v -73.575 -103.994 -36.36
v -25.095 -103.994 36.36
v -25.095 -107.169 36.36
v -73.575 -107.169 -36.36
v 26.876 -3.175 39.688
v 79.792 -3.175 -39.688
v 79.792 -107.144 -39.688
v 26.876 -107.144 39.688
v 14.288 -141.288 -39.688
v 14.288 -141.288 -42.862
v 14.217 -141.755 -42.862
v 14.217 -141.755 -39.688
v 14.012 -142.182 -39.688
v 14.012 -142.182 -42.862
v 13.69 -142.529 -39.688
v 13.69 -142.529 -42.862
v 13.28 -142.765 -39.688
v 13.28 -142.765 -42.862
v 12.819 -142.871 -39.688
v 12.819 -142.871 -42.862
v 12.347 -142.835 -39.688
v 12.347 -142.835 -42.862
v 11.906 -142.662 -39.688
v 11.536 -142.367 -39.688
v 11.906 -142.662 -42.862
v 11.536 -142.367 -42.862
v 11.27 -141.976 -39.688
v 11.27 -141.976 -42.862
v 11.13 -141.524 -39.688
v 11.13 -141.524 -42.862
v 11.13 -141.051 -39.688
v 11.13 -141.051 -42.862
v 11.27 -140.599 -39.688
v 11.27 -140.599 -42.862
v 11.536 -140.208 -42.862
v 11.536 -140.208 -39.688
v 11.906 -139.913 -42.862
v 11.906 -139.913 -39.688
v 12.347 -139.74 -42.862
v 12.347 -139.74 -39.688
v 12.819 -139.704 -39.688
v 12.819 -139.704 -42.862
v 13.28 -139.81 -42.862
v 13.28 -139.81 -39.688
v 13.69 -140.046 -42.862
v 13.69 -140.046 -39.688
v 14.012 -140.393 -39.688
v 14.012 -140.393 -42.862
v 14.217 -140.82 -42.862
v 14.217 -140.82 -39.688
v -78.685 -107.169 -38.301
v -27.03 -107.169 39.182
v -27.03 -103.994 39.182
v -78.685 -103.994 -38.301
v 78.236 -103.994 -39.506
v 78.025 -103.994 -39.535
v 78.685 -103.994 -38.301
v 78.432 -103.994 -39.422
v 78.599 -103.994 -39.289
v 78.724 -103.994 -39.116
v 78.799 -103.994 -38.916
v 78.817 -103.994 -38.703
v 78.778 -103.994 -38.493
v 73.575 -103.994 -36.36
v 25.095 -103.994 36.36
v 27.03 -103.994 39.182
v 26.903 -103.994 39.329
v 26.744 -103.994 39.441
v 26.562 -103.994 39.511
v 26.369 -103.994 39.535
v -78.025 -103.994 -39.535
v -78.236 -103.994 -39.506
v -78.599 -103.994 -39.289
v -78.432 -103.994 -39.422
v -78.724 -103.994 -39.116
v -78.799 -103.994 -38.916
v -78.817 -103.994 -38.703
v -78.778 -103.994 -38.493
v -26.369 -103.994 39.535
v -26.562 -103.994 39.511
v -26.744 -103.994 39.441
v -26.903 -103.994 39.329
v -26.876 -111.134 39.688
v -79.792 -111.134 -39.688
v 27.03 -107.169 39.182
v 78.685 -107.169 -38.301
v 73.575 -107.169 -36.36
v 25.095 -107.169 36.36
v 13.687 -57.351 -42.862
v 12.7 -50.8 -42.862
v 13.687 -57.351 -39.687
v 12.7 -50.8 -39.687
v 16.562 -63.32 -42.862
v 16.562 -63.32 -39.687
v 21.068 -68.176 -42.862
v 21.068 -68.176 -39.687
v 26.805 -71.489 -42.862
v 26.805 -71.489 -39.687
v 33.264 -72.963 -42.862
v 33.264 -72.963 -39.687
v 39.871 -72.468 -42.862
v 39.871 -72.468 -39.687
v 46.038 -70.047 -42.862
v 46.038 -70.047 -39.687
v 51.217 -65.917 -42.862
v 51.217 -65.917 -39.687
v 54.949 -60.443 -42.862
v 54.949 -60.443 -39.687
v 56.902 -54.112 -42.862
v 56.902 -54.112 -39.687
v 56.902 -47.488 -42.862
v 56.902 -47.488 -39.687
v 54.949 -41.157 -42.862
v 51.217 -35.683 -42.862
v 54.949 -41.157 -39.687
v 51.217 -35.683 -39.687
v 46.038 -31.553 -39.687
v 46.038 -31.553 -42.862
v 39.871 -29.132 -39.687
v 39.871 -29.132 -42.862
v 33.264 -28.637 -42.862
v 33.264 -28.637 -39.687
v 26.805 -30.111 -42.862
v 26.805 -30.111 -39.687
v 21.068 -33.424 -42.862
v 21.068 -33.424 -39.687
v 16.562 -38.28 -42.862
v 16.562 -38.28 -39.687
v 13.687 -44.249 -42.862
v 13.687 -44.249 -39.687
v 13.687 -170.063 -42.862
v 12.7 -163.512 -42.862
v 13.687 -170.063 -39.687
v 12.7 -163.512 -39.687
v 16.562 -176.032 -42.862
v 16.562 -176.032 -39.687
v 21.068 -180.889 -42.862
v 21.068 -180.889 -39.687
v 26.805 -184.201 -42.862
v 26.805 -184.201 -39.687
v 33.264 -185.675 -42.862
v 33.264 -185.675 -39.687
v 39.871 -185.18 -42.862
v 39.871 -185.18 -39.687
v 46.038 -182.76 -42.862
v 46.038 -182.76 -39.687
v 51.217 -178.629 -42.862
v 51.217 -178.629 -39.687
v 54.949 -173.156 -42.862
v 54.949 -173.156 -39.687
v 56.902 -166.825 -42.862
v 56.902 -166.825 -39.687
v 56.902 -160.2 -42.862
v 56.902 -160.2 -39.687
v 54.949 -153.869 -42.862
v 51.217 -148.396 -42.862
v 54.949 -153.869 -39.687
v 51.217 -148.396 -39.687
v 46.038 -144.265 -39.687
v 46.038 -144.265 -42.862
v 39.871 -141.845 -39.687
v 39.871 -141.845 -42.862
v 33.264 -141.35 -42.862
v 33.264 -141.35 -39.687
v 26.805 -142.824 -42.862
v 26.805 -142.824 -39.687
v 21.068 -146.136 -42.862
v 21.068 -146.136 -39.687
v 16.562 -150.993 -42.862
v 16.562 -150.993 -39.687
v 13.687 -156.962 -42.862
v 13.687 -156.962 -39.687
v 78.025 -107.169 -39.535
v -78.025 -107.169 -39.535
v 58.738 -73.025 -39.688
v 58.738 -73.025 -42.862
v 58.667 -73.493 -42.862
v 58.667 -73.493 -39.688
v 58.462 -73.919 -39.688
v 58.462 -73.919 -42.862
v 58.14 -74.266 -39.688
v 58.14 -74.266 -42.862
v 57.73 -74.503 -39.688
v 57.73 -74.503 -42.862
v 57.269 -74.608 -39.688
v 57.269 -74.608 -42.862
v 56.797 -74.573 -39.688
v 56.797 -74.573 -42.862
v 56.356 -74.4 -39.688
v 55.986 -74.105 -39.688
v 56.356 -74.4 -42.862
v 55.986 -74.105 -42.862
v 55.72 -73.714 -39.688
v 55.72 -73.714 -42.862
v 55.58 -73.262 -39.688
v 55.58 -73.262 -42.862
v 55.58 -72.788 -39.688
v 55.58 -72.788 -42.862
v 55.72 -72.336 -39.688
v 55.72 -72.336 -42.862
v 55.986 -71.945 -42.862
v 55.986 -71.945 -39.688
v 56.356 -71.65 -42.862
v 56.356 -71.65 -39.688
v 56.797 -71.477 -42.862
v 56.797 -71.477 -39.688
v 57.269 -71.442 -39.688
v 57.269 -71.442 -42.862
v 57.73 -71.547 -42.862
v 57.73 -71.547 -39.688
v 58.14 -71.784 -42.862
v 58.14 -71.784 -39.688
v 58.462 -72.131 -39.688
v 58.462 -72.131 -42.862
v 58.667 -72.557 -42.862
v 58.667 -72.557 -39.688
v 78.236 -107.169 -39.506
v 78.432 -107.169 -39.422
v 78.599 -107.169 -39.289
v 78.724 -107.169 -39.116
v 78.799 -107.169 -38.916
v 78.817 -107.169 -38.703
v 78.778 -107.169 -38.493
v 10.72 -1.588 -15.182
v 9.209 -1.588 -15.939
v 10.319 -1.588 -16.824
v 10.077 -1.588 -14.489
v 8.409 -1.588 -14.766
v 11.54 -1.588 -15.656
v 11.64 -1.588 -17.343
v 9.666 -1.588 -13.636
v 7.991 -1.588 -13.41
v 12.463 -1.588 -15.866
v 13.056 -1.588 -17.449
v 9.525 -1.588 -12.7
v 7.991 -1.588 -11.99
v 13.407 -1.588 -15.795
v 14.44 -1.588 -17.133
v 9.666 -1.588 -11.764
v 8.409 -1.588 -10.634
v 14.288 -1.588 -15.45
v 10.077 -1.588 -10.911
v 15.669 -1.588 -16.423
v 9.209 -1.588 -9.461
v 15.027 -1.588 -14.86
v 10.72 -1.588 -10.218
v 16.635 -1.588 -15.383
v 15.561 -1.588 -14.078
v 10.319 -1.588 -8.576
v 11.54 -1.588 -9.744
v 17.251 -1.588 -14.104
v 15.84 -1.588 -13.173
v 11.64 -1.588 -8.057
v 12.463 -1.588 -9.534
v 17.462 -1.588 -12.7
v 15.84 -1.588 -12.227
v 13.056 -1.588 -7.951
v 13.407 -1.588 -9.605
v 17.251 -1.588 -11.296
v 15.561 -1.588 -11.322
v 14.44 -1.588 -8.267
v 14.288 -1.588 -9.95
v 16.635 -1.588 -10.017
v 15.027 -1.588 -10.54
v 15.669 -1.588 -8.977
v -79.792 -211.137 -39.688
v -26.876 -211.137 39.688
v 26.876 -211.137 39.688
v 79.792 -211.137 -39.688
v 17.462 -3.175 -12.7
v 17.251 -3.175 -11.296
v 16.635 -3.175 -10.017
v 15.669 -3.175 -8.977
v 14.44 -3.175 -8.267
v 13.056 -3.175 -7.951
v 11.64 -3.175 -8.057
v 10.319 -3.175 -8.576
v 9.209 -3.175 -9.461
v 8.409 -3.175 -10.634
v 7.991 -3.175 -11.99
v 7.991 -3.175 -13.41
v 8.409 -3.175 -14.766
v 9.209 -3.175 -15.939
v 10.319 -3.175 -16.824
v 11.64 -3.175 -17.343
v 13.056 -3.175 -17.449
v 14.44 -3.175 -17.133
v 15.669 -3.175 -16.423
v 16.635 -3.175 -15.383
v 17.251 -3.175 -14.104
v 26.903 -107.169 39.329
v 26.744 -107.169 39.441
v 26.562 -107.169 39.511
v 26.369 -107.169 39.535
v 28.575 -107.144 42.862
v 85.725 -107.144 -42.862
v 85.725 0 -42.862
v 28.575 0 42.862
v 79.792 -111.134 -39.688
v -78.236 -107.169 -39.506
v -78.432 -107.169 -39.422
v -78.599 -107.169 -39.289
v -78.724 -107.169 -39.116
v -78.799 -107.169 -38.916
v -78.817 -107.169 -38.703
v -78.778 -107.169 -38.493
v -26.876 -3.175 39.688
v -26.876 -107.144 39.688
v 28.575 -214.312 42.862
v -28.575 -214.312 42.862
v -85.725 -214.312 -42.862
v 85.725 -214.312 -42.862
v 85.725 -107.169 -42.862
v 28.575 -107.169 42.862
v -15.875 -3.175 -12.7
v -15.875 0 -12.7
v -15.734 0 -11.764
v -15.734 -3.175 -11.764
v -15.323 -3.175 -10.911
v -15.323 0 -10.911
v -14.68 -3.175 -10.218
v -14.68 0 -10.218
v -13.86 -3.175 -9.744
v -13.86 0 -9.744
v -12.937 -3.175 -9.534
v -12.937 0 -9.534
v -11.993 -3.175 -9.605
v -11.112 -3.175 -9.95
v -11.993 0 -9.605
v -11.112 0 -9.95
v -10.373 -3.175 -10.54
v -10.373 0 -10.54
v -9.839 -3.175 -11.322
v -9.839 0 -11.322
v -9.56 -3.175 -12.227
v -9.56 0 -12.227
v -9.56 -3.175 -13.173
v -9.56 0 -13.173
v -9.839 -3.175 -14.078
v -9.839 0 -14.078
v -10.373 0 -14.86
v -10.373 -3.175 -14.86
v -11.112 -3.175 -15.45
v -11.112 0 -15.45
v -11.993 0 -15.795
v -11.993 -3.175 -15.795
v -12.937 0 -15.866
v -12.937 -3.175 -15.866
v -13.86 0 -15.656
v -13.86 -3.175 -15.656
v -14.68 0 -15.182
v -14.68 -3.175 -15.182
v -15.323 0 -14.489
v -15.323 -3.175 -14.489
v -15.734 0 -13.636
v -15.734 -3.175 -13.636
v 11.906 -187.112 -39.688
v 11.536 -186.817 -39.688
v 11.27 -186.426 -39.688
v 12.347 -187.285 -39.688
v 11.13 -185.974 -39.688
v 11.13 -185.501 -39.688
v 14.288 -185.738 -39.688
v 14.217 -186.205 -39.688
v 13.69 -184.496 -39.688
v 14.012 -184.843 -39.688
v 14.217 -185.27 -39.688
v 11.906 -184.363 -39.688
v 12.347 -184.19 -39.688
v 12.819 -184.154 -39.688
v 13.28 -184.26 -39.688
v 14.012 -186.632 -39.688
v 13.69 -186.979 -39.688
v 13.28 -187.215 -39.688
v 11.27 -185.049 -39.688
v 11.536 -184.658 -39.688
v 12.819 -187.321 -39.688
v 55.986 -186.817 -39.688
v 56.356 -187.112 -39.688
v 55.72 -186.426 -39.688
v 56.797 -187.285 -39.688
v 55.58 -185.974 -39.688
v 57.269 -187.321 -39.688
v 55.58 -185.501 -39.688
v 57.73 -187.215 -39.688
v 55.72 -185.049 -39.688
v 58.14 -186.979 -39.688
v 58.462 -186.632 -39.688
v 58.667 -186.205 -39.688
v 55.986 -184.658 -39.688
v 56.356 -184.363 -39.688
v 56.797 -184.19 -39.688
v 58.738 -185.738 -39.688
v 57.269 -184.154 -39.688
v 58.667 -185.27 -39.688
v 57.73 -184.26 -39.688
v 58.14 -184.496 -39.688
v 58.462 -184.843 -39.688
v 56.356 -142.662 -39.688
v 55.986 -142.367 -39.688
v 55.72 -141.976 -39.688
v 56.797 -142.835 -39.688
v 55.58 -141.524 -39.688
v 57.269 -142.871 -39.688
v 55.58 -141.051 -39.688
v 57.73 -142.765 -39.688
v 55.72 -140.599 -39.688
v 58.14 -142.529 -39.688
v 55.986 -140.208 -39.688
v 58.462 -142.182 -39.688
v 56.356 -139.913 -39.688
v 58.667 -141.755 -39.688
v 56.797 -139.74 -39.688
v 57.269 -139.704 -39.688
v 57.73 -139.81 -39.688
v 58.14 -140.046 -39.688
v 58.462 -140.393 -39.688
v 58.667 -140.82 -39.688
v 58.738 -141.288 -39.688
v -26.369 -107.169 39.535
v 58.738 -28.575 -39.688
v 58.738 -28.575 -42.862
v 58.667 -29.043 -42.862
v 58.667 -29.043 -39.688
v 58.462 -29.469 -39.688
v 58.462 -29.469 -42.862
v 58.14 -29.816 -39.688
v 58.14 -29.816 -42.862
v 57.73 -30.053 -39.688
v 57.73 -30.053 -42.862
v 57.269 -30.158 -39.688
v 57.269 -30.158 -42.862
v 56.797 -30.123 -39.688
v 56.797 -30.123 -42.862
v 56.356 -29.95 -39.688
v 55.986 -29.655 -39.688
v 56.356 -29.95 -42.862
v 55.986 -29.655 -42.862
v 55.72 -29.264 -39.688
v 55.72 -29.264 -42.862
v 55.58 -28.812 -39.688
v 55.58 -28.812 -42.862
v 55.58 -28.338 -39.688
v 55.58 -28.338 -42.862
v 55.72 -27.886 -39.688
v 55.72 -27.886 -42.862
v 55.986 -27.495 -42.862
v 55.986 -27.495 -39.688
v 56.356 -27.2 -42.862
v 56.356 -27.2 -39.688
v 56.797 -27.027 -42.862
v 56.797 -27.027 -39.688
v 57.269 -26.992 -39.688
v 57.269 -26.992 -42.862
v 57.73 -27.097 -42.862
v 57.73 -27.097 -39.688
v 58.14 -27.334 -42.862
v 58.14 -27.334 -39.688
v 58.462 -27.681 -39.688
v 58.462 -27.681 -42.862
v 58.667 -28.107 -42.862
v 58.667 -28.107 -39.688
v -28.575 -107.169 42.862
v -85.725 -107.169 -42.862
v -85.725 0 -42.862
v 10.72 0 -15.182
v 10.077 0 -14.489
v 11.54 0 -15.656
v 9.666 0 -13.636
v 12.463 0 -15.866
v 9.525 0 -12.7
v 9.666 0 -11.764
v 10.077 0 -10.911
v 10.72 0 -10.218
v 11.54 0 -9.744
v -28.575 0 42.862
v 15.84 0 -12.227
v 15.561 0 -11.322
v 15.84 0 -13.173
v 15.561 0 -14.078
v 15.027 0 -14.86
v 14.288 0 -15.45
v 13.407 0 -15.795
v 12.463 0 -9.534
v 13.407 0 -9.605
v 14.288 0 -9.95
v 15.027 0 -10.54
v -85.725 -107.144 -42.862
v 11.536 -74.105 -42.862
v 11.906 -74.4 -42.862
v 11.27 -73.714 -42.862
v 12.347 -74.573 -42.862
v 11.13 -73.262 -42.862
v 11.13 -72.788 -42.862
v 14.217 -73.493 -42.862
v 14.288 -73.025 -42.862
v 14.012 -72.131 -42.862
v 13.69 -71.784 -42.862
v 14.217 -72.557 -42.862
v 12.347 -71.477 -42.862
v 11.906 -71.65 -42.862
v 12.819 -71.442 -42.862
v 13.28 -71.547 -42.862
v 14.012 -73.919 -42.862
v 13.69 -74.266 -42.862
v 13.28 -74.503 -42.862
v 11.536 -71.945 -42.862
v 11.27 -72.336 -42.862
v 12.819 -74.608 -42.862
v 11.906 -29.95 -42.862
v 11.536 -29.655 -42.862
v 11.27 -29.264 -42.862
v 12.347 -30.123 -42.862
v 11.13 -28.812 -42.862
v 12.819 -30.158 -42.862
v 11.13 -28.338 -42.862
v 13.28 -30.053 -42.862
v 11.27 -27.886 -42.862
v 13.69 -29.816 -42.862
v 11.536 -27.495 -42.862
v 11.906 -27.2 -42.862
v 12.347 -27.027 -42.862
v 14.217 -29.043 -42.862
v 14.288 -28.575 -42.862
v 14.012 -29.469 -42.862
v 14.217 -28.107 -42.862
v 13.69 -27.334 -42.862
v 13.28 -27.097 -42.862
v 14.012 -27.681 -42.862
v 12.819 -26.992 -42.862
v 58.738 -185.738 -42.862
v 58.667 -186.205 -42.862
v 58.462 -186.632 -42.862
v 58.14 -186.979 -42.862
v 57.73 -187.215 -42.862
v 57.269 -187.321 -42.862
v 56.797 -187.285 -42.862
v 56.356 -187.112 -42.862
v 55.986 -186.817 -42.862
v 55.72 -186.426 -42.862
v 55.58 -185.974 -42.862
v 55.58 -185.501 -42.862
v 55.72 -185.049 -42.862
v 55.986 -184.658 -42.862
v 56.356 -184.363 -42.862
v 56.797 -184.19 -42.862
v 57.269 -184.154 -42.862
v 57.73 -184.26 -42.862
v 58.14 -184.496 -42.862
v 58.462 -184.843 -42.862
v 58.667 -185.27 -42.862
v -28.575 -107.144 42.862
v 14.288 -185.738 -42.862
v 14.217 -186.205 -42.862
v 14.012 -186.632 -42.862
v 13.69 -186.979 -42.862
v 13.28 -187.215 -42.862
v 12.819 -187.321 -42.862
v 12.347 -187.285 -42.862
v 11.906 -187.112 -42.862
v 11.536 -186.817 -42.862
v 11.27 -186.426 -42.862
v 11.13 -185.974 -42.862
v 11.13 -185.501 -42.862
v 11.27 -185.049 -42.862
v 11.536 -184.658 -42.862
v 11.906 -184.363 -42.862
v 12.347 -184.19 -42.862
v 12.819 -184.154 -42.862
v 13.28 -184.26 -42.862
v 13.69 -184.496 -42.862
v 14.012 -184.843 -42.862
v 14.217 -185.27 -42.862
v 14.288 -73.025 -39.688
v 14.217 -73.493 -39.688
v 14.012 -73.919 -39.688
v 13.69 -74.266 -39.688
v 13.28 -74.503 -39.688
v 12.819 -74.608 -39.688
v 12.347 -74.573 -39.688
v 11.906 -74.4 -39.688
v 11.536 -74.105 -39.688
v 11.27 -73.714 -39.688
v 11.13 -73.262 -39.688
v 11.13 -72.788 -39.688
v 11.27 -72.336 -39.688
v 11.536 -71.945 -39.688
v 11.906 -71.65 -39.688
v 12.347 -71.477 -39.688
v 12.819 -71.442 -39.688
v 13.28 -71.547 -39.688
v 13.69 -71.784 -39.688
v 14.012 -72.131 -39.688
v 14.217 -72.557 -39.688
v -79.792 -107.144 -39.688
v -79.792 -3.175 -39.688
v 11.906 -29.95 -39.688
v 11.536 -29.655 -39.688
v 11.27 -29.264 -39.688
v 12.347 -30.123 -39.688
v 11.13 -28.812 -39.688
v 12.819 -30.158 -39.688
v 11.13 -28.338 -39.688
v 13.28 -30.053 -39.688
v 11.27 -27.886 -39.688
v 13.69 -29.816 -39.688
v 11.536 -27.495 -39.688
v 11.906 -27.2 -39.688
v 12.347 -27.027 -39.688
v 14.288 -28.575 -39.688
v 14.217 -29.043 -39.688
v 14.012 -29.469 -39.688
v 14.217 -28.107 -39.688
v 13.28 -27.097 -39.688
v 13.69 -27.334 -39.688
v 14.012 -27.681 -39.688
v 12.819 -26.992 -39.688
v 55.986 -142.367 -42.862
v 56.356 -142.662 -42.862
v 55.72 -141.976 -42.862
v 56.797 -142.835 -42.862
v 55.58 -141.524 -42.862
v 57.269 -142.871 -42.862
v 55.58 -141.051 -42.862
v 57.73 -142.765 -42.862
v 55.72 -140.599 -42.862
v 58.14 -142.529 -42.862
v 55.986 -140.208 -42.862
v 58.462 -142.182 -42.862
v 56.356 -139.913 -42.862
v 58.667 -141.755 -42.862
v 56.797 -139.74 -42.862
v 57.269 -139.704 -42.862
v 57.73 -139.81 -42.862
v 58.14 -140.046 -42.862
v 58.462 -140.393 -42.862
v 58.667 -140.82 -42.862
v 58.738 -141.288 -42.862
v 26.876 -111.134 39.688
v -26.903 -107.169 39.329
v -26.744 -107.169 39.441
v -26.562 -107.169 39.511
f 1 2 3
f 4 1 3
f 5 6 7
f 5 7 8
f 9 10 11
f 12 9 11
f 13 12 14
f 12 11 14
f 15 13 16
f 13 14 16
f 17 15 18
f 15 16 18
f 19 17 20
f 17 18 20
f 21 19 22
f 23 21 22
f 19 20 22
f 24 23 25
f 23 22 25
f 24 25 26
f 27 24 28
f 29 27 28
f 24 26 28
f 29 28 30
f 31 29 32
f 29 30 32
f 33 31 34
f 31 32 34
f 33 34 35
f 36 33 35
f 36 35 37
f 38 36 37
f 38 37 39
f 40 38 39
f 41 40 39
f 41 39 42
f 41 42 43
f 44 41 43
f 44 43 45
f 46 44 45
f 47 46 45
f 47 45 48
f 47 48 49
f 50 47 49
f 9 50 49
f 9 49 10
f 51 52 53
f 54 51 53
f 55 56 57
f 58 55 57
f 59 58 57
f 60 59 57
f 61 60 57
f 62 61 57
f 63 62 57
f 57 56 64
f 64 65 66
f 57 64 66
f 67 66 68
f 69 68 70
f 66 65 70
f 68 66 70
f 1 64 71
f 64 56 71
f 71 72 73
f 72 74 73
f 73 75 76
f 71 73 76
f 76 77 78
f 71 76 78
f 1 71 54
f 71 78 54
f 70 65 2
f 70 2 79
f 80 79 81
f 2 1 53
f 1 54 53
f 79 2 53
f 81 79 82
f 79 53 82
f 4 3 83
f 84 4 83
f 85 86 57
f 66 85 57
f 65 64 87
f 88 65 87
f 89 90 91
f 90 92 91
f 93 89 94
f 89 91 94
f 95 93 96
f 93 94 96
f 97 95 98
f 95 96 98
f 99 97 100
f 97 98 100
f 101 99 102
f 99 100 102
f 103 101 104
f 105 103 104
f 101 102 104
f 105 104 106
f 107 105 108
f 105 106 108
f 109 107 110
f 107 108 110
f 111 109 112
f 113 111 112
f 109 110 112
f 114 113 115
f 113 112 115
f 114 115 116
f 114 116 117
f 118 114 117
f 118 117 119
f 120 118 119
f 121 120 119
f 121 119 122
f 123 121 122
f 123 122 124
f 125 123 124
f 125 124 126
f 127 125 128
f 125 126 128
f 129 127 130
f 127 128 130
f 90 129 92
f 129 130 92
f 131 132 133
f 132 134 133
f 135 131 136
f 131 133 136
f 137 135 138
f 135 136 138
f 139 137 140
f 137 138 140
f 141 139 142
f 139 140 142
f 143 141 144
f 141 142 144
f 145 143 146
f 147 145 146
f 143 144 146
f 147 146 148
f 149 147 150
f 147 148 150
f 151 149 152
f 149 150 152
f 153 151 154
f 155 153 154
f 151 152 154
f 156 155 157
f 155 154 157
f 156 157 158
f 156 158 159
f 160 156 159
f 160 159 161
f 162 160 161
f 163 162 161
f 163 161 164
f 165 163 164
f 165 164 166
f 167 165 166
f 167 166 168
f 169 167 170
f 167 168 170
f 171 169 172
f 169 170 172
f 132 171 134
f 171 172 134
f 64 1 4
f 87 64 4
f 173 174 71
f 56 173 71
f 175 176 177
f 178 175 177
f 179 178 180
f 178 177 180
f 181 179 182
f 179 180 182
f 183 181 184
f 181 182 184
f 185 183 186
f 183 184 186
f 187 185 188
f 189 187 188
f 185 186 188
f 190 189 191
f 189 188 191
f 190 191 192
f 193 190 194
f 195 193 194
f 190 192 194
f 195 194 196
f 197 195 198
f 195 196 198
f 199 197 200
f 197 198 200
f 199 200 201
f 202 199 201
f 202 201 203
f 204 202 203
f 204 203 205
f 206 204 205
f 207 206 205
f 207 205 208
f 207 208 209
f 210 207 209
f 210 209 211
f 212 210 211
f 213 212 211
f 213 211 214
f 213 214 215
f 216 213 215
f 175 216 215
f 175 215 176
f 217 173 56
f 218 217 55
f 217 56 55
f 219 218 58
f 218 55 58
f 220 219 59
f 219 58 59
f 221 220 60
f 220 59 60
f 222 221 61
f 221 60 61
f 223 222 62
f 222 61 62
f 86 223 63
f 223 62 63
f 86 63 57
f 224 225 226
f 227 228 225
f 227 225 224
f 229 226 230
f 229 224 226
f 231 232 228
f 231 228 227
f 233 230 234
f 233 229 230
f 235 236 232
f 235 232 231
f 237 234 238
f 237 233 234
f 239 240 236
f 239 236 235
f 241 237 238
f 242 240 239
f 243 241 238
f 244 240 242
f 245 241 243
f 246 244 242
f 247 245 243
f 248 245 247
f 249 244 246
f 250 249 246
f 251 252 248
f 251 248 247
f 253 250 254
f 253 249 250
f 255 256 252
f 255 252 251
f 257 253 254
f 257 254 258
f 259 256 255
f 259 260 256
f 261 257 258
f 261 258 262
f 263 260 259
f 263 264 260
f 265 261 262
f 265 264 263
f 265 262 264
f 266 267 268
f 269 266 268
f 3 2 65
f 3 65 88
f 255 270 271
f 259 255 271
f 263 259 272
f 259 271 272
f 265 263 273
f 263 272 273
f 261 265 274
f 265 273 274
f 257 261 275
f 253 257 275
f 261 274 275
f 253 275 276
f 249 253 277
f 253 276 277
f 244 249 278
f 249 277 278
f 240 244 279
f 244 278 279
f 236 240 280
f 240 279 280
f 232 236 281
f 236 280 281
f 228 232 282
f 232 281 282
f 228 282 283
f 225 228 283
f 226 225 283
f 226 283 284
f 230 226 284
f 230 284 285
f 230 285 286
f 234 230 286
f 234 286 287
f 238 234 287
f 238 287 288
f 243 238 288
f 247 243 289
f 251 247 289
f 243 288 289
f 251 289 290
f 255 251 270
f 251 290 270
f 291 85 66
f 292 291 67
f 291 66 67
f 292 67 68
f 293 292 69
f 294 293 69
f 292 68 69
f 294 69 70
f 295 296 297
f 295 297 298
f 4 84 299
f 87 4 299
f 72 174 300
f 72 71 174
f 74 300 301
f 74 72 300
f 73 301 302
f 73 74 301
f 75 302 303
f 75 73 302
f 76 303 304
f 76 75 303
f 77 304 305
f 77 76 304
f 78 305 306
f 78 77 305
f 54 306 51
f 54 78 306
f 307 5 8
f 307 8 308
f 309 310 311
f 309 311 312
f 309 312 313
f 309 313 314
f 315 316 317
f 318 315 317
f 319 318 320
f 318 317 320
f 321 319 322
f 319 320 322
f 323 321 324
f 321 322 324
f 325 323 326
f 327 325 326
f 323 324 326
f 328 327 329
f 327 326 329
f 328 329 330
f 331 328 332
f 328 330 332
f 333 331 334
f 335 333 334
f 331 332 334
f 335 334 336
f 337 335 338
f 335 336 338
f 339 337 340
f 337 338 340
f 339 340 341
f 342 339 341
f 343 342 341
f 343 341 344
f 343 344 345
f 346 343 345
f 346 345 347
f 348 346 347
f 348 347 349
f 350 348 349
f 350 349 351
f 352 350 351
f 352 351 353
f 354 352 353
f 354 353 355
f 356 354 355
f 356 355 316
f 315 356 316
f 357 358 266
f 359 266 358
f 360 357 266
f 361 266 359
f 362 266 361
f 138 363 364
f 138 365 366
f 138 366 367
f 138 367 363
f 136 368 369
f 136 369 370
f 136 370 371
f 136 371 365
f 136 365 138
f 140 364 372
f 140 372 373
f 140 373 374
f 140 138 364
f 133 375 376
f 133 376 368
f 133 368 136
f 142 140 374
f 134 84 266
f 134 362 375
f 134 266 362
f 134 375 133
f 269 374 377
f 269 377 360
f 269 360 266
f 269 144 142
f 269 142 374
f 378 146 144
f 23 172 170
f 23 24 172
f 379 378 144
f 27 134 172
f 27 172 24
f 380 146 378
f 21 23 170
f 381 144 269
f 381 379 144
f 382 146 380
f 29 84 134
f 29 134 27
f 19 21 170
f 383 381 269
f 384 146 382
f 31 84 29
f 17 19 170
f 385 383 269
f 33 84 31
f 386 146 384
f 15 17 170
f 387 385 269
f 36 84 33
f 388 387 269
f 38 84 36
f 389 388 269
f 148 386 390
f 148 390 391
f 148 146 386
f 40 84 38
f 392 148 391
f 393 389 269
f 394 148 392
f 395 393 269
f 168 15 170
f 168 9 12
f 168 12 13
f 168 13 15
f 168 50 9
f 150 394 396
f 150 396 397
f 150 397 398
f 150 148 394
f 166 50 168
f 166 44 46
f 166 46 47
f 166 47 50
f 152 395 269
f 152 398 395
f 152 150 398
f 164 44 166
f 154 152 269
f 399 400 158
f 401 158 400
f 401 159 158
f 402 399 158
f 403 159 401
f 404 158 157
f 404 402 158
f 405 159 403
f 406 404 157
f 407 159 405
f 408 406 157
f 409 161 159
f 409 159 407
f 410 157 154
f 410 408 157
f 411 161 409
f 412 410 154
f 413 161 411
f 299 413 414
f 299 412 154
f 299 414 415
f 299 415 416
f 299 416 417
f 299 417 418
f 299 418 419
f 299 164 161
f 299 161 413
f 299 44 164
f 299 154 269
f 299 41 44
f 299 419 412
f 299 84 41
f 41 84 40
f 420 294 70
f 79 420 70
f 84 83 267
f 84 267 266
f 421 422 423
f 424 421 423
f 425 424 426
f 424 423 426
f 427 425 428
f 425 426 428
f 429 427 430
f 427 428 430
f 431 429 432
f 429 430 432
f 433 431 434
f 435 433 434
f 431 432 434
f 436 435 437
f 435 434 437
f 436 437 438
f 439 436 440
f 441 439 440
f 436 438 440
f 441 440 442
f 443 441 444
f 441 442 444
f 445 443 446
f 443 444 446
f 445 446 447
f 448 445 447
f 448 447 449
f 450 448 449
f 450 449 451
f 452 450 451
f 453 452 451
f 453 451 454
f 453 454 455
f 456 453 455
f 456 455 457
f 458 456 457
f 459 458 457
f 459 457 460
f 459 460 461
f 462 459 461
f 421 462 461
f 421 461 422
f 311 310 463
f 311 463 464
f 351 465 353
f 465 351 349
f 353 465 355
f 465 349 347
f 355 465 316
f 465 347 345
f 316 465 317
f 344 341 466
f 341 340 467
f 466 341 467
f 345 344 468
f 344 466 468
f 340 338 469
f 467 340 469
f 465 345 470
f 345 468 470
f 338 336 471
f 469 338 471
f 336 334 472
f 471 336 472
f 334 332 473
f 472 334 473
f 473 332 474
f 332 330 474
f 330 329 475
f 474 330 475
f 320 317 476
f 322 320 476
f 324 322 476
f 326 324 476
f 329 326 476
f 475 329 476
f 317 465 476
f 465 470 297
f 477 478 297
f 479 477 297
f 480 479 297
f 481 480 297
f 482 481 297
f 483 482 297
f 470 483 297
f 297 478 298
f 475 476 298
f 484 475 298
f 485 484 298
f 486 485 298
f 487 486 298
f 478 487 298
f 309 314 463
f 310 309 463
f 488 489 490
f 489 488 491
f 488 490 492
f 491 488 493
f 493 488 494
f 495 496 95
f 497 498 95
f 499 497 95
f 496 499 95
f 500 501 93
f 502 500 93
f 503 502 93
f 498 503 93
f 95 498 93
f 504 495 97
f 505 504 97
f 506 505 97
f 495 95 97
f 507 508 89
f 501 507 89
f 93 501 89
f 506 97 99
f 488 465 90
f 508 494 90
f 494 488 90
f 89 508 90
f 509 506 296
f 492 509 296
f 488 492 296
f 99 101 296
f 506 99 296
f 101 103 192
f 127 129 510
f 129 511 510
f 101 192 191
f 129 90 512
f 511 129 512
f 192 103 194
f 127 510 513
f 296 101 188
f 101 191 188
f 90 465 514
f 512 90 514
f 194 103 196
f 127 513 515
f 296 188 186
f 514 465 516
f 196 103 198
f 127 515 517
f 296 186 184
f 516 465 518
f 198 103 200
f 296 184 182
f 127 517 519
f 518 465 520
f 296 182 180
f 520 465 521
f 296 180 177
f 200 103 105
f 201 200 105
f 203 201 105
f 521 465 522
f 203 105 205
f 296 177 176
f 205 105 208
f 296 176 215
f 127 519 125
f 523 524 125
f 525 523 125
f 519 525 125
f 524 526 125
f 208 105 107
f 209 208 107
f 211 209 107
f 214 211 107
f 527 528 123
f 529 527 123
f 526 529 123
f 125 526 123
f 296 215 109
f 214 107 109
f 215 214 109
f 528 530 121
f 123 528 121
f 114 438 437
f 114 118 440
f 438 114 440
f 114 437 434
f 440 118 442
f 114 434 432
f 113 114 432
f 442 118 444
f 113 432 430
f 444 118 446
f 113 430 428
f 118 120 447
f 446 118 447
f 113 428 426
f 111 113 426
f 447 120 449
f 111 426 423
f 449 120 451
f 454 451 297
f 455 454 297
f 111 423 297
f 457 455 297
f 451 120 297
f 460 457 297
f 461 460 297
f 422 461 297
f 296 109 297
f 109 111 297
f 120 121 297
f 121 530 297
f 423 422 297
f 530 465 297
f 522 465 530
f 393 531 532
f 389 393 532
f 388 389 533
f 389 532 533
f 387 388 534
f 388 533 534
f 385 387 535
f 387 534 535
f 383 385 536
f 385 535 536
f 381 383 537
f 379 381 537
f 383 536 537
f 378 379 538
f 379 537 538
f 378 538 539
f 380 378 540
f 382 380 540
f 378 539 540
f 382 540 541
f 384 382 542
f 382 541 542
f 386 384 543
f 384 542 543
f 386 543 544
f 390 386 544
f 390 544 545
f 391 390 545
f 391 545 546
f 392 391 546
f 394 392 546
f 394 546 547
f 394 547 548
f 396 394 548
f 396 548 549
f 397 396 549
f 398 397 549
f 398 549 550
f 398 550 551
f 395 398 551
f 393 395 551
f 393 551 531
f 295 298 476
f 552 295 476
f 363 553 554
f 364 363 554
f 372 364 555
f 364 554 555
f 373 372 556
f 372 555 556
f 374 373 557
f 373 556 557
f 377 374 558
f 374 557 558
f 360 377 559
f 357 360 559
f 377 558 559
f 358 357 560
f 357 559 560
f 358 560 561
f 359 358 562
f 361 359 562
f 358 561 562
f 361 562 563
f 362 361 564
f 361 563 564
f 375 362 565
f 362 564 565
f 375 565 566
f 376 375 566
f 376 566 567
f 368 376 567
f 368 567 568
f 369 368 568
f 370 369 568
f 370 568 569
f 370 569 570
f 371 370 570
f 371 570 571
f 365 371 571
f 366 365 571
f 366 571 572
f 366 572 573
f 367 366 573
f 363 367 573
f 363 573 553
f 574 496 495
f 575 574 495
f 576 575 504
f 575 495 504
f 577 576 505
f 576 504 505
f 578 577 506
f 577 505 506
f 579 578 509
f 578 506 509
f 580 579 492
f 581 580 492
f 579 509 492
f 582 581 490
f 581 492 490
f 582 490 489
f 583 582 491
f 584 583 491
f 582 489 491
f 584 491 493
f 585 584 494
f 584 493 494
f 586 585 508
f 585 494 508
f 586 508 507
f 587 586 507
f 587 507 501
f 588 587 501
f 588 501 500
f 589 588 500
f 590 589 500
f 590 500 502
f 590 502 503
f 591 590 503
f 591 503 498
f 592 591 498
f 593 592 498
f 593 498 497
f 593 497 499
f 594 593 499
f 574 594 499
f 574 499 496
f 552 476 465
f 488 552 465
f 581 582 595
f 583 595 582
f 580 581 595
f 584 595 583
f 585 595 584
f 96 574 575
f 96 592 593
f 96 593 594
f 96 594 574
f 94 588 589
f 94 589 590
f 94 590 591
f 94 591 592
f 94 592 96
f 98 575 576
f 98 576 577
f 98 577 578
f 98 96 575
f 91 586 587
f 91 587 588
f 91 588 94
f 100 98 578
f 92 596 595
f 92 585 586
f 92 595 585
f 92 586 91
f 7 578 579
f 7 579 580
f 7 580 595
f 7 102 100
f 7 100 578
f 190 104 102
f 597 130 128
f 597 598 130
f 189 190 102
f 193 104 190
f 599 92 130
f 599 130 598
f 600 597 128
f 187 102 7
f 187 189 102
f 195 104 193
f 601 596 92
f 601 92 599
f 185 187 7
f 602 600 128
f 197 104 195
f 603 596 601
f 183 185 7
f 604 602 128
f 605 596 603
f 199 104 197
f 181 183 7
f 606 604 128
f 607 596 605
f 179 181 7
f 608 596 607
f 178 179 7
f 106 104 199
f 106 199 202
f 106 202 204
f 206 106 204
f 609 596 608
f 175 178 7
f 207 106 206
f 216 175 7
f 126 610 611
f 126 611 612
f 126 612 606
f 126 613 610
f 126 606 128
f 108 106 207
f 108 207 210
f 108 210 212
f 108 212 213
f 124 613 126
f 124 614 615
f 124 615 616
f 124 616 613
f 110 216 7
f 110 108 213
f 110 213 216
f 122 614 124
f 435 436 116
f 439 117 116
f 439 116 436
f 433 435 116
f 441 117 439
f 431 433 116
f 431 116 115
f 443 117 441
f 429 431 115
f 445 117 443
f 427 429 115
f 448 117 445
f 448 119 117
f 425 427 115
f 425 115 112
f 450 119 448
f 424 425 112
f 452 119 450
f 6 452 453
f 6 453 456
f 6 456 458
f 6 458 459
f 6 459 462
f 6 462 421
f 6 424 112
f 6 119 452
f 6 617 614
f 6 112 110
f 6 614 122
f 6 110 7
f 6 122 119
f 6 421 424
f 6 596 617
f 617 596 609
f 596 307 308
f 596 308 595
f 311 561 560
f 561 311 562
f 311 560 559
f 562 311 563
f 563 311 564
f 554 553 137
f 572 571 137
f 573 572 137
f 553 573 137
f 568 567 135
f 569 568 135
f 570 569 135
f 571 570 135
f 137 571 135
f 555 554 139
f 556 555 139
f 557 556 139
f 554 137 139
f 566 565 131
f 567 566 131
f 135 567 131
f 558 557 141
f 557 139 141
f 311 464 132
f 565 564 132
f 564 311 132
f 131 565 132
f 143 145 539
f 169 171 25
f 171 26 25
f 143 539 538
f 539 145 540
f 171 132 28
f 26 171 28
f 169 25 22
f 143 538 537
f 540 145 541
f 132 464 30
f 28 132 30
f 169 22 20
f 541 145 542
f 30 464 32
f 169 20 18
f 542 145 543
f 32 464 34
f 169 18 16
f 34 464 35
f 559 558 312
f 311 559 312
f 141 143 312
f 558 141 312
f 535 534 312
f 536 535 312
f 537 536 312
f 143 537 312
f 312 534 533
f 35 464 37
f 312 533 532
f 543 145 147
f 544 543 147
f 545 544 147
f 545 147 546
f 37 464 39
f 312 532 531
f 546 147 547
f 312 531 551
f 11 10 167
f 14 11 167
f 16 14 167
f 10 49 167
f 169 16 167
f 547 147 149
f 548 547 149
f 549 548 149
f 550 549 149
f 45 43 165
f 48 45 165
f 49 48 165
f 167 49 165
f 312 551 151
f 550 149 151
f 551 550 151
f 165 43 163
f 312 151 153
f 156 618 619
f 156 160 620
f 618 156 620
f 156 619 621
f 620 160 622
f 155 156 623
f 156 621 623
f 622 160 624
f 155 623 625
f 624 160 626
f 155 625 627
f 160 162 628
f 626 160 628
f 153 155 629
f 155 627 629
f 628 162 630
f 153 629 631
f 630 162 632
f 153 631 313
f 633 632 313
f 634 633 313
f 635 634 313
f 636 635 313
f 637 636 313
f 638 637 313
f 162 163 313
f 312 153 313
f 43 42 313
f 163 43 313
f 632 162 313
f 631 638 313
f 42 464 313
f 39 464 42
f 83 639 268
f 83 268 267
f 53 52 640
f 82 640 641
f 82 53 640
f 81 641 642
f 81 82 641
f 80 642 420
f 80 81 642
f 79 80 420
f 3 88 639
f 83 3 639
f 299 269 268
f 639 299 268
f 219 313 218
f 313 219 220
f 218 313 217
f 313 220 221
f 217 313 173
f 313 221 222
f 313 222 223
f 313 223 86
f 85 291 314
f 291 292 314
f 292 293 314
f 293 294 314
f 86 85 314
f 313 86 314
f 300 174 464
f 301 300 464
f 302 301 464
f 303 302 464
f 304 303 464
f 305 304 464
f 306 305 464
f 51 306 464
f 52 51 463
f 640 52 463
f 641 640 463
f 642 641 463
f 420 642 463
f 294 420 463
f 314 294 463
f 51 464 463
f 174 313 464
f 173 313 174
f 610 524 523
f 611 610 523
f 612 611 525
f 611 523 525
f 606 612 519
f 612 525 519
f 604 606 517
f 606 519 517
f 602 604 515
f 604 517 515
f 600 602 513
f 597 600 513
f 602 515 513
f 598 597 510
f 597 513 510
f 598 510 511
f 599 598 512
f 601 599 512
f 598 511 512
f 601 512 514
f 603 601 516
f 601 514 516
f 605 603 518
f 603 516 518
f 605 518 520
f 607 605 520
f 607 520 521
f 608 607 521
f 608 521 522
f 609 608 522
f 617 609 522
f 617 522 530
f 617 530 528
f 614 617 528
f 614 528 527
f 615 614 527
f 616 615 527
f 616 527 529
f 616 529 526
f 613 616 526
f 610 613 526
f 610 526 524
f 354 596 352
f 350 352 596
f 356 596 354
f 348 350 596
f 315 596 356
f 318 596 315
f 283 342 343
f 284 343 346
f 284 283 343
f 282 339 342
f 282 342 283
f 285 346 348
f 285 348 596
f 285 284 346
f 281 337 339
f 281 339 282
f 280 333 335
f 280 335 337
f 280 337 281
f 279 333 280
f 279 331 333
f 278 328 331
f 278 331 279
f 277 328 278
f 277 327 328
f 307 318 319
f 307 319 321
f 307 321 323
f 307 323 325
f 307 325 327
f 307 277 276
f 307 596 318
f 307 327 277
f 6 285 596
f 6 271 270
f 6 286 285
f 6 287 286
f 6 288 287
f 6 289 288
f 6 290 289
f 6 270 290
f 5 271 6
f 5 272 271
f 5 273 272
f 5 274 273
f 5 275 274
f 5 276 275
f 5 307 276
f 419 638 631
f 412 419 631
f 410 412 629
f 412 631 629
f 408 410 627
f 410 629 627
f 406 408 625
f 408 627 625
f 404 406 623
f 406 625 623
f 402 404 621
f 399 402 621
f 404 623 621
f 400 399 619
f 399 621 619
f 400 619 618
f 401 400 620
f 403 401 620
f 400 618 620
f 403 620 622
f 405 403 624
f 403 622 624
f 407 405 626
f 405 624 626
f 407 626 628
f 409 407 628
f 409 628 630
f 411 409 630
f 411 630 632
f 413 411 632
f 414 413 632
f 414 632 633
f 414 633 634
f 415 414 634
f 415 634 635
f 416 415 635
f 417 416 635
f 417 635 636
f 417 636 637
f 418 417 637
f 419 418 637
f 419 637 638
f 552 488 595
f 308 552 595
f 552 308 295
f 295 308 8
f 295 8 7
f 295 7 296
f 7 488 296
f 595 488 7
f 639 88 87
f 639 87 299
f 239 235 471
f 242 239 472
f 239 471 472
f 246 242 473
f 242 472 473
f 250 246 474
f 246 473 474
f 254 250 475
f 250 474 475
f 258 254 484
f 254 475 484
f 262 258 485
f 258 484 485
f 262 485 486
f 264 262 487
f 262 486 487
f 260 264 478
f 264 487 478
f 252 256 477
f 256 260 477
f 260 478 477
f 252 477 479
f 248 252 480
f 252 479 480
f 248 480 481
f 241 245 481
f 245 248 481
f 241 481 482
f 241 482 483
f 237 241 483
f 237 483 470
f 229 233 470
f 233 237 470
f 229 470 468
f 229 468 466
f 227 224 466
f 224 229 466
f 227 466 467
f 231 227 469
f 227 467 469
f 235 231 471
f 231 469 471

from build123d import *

# Parameters (mm, degrees)
F1_DEPTH  = 214.3125
F2_T      = -3.175
F4_DEPTH  = 3.175
F6_D      = 44.45
F6_DEPTH  = 3.175
F6_TIP    = 13.3541272579
F7_R      = 3.175
F8_DEPTH  = 25.4
F9_R      = 3.175
F10_DEPTH = 25.4
F5_R      = 1.5875
F11_DEPTH = 12.7
F12_R     = 4.7625
F12_R_2   = 3.175
F13_DEPTH = 1.5875
F14_W     = 171.45
F14_H     = 0.0254
F15_DEPTH = 85.725
F16_W     = 3.175
F16_H     = 3.175
F18_R     = 0.79375


with BuildPart() as f1:
    # F0 (on Front) → F1 (new body)
    with BuildSketch(Plane.XZ):
        Polygon((0, 42.8625), (0, -42.8625), (85.725, -42.8625), (28.575, 42.8625), align=None)
        Polygon((-28.575, 42.8625), (-85.725, -42.8625), (0, -42.8625), (0, 42.8625), align=None)
    extrude(amount=F1_DEPTH)

    # F2
    f2_openings = [f1.faces().sort_by_distance(p)[0] for p in [
        (0, 0, -7.14375),
    ]]
    offset(amount=F2_T, openings=f2_openings)

    # F3 (on Front) → F4 (join)
    with BuildSketch(Plane.XZ):
        Polygon((28.575, 42.8625), (-28.575, 42.8625), (-85.725, -42.8625), (85.725, -42.8625), align=None)
    extrude(amount=F4_DEPTH)

    # F6
    with Locations(Plane(origin=(0, 0, -42.8625), x_dir=(1, 0, 0), z_dir=(0, 0, -1))):
        with Locations((34.925, 50.8), (34.925, 163.5125)):
            Hole(F6_D / 2, depth=F6_DEPTH)
            with Locations((0, 0, -(F6_DEPTH + F6_TIP / 2))):  # 118° drill point
                Cone(0, F6_D / 2, F6_TIP, mode=Mode.SUBTRACT)

    # F7 (on face) → F8 (cut)
    with BuildSketch(Plane(origin=(0, 0, 0), x_dir=(-1, 0, 0), z_dir=(0, 1, 0))):
        with Locations((12.7, -12.7)):
            Circle(F7_R)
    extrude(amount=-F8_DEPTH, mode=Mode.SUBTRACT)

    # F9 (on face) → F10 (cut)
    with BuildSketch(Plane(origin=(0, 0, 0), x_dir=(-1, 0, 0), z_dir=(0, 1, 0))):
        with Locations((-12.7, -12.7)):
            Circle(F9_R)
    extrude(amount=-F10_DEPTH, mode=Mode.SUBTRACT)

    # F5 (on face) → F11 (cut)
    with BuildSketch(Plane(origin=(0, 0, -42.8625), x_dir=(1, 0, 0), z_dir=(0, 0, -1))):
        with Locations((57.15, 73.025)):
            Circle(F5_R)
        with Locations((57.15, 28.575)):
            Circle(F5_R)
        with Locations((12.7, 28.575)):
            Circle(F5_R)
        with Locations((12.7, 73.025)):
            Circle(F5_R)
        with Locations((12.7, 185.7375)):
            Circle(F5_R)
        with Locations((57.15, 185.7375)):
            Circle(F5_R)
        with Locations((57.15, 141.2875)):
            Circle(F5_R)
        with Locations((12.7, 141.2875)):
            Circle(F5_R)
    extrude(amount=-F11_DEPTH, mode=Mode.SUBTRACT)

    # F12 (on face) → F13 (cut)
    with BuildSketch(Plane.XZ.offset(3.175)):
        with Locations((12.7, -12.7)):
            Circle(F12_R)
        with Locations((12.7, -12.7)):
            Circle(F12_R_2, mode=Mode.SUBTRACT)
    extrude(amount=-F13_DEPTH, mode=Mode.SUBTRACT)

    # F14 (on face) → F15 (cut, through all)
    with BuildSketch(Plane(origin=(0, 0, -42.8625), x_dir=(1, 0, 0), z_dir=(0, 0, -1))):
        with Locations((0, 107.15625)):
            Rectangle(F14_W, F14_H)
    extrude(amount=-F15_DEPTH, mode=Mode.SUBTRACT)

    # F17: sweep along a path in F17_path
    with BuildLine(Plane(origin=(79.7924582335, -107.16895, -39.6875), x_dir=(0, 0, -1), z_dir=(0, 1, 0))) as f17_path:
        Line((0, 0), (0, 159.5849164669))
        Line((0, 159.5849164669), (-79.375, 106.6682498003))
        Line((-79.375, 106.6682498003), (-79.375, 52.9166666667))
        Line((-79.375, 52.9166666667), (0, 0))
    # F16 (on Right) → F17 (sweep)
    with BuildSketch(Plane.YZ):
        Polygon((-107.16895, -36.3601), (-111.134390904, -39.6875), (-107.16895, -39.6875), (-107.16895, -39.5351), align=None)
        with Locations((-105.58145, -37.9476)):
            Rectangle(F16_W, F16_H)
    sweep(path=f17_path.line, transition=Transition.RIGHT)

    # F18
    f18_edges = [f1.edges().sort_by_distance(p)[0] for p in [
        (-26.79423, -105.58145, 39.5351),
        (26.79423, -105.58145, 39.5351),
        (-79.507696, -105.58145, -39.5351),
        (79.507696, -105.58145, -39.5351),
    ]]
    fillet(f18_edges, radius=F18_R)


solid = f1.part
